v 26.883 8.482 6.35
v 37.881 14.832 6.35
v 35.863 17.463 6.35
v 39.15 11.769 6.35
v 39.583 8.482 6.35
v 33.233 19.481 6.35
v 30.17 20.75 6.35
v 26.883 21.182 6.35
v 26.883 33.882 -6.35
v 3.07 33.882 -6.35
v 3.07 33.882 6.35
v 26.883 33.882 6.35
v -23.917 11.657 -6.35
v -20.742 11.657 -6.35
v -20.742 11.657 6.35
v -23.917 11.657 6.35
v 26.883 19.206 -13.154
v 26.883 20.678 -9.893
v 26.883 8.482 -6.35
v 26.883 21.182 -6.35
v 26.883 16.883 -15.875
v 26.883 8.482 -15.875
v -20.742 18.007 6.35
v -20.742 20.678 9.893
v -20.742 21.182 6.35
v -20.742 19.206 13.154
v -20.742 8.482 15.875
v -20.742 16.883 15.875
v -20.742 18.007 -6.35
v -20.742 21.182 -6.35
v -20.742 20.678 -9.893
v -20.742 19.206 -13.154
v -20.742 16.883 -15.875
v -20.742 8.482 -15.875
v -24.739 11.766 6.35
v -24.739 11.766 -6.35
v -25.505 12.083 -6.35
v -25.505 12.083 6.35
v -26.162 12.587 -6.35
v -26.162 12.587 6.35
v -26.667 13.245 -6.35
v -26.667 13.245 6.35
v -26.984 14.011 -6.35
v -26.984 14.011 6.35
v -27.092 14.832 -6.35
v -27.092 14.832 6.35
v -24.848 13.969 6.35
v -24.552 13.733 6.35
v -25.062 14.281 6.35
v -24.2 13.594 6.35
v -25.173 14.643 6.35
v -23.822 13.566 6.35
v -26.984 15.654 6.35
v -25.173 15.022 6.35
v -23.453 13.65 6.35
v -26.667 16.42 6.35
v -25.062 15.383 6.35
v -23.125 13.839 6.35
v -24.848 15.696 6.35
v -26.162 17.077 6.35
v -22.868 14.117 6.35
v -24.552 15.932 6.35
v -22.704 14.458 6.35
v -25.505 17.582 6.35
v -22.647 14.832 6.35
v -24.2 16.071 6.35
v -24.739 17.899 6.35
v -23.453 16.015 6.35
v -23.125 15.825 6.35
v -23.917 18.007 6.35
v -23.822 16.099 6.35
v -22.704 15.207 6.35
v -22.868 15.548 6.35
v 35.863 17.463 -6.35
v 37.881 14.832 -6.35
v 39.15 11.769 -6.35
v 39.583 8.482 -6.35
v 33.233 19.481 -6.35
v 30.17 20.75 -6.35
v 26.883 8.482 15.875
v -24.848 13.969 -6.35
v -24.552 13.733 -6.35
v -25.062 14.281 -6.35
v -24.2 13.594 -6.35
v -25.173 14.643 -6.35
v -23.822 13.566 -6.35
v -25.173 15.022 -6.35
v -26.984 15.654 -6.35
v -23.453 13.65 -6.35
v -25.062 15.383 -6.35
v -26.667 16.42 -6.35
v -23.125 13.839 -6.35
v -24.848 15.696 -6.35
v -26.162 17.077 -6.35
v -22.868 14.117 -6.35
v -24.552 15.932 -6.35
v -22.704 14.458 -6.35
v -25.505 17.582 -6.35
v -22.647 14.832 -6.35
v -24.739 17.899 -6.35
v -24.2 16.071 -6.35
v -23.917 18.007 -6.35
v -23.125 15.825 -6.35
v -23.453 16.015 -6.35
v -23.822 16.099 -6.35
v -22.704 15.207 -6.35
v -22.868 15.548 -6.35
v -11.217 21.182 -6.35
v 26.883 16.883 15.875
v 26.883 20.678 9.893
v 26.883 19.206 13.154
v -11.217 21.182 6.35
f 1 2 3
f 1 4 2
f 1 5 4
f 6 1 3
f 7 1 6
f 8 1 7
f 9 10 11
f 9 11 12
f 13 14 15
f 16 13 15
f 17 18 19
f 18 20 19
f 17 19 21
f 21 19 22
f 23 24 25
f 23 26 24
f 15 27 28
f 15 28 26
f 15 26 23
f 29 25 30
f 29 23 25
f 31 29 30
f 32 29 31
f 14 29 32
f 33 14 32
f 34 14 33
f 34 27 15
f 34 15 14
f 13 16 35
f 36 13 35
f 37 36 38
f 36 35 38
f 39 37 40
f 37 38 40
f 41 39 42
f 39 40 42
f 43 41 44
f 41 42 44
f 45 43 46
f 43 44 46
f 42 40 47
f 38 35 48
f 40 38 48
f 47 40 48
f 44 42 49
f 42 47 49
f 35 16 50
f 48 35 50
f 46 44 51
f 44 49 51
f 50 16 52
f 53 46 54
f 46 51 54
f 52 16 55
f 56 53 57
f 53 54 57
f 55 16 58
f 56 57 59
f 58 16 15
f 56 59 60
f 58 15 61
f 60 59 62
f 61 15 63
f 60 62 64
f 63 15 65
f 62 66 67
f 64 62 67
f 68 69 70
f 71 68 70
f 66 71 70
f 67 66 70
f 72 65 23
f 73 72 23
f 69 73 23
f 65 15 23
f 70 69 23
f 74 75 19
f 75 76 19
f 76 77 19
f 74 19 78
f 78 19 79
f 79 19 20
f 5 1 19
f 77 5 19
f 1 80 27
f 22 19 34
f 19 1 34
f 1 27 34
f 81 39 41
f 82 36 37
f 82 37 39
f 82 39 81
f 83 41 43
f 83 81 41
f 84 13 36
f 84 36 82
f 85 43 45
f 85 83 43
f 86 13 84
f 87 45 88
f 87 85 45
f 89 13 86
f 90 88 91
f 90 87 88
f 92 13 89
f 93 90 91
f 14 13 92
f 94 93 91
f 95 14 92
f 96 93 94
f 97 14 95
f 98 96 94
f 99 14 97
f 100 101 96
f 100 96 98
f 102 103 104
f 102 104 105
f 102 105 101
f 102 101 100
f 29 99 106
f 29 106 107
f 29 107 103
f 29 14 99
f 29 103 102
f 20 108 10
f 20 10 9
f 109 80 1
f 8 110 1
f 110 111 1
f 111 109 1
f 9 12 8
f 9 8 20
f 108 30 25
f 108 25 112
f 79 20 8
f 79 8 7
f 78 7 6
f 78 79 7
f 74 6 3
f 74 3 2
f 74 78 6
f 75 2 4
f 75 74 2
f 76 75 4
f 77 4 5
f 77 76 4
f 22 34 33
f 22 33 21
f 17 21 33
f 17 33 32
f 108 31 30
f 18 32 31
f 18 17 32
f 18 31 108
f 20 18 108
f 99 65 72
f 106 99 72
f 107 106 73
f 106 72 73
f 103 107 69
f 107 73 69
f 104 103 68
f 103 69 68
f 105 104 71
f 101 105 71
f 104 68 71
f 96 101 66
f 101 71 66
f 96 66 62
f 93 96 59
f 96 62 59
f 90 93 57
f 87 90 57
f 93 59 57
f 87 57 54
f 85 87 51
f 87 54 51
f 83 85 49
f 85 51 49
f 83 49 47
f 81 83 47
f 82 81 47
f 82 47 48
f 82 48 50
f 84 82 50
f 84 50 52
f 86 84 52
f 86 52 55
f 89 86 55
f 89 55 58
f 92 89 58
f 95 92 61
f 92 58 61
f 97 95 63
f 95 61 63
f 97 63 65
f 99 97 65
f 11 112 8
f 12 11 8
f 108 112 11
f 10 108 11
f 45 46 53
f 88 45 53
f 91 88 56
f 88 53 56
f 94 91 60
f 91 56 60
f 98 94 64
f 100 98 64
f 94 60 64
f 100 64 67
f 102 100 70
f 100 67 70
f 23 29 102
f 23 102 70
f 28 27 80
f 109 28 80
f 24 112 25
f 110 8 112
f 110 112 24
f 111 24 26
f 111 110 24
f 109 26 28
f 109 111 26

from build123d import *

# Parameters (mm, degrees)
SKETCH1_W           = 95.25
SKETCH1_H           = 63.5
BOSS_EXTRUDE1_DEPTH = 25.4
SKETCH2_W           = 76.2
SKETCH2_H           = 25.4
BOSS_EXTRUDE2_DEPTH = 25.4
CUT_EXTRUDE1_DEPTH  = 25.4
SKETCH4_W           = 25.4
SKETCH4_H           = 25.4
BOSS_EXTRUDE3_DEPTH = 25.4
CUT_EXTRUDE2_DEPTH  = 25.4
CUT_EXTRUDE3_DEPTH  = 95.25
SKETCH_1648_W       = 25.4
SKETCH_1648_H       = 12.7
BOSS_EXTRUDE4_DEPTH = 12.7
CUT_EXTRUDE4_DEPTH  = 25.4
SKETCH10_R          = 2.54
CUT_EXTRUDE5_DEPTH  = 25.4
SCALE1_SCALE        = 0.5


with BuildPart() as part:
    # Sketch1 → Boss-Extrude1 (new body)
    with BuildSketch(Plane(origin=(0, 0, 0), x_dir=(1, 0, 0), z_dir=(0, 1, 0))):
        Rectangle(SKETCH1_W, SKETCH1_H)
    extrude(amount=BOSS_EXTRUDE1_DEPTH)

    # Sketch2 → Boss-Extrude2 (add)
    with BuildSketch(Plane(origin=(0, 25.4, 0), x_dir=(1, 0, 0), z_dir=(0, 1, 0))):
        with Locations((9.525, 0)):
            Rectangle(SKETCH2_W, SKETCH2_H)
    extrude(amount=BOSS_EXTRUDE2_DEPTH)

    # Sketch3 → Cut-Extrude1 (cut)
    with BuildSketch(Plane.XY.offset(12.7)):
        Polygon((-28.575, 50.8), (-28.575, 25.4), (0, 50.8), align=None)
    extrude(amount=-CUT_EXTRUDE1_DEPTH, mode=Mode.SUBTRACT)

    # Sketch4 → Boss-Extrude3 (add)
    with BuildSketch(Plane(origin=(47.625, 0, 0), x_dir=(0, 0, -1), z_dir=(1, 0, 0))):
        with Locations((0, 12.7)):
            Rectangle(SKETCH4_W, SKETCH4_H)
    extrude(amount=BOSS_EXTRUDE3_DEPTH)

    # Sketch5 → Cut-Extrude2 (cut)
    with BuildSketch(Plane(origin=(0, 0, -12.7), x_dir=(-1, 0, 0), z_dir=(0, 0, -1))):
        with BuildLine():
            ThreePointArc((-47.625, 25.4), (-65.585512242, 17.960512242), (-73.025, 0))
            Line((-73.025, 0), (-73.025, 25.4))
            Line((-73.025, 25.4), (-47.625, 25.4))
        make_face()
    extrude(amount=-CUT_EXTRUDE2_DEPTH, mode=Mode.SUBTRACT)

    # Sketch7 → Cut-Extrude3 (cut)
    with BuildSketch(Plane(origin=(47.625, 0, 0), x_dir=(0, 0, -1), z_dir=(1, 0, 0))):
        with BuildLine():
            Line((-31.75, 16.800520825), (-31.75, 25.4))
            Line((-31.75, 25.4), (-12.7, 25.4))
            ThreePointArc((-12.7, 25.4), (-23.150520825, 23.150520825), (-31.75, 16.800520825))
        make_face()
        with BuildLine():
            Line((12.7, 25.4), (31.75, 25.4))
            Line((31.75, 25.4), (31.75, 16.800520825))
            ThreePointArc((31.75, 16.800520825), (23.150520825, 23.150520825), (12.7, 25.4))
        make_face()
    extrude(amount=-CUT_EXTRUDE3_DEPTH, mode=Mode.SUBTRACT)

    # Sketch 1648 → Boss-Extrude4 (add)
    with BuildSketch(Plane.ZY.offset(47.625)):
        with Locations((0, 12.7)):
            Rectangle(SKETCH_1648_W, SKETCH_1648_H)
    extrude(amount=BOSS_EXTRUDE4_DEPTH)

    # Sketch9 → Cut-Extrude4 (cut)
    with BuildSketch(Plane.XY.offset(12.7)):
        with BuildLine():
            ThreePointArc((-53.975, 6.35), (-58.465128061, 8.209871939), (-60.325, 12.7))
            Line((-60.325, 12.7), (-60.325, 6.35))
            Line((-60.325, 6.35), (-53.975, 6.35))
        make_face()
        with BuildLine():
            Line((-60.325, 19.05), (-60.325, 12.7))
            ThreePointArc((-60.325, 12.7), (-58.465128061, 17.190128061), (-53.975, 19.05))
            Line((-53.975, 19.05), (-60.325, 19.05))
        make_face()
    extrude(amount=-CUT_EXTRUDE4_DEPTH, mode=Mode.SUBTRACT)

    # Sketch10 → Cut-Extrude5 (cut)
    with BuildSketch(Plane.XY.offset(12.7)):
        with Locations((-53.975, 12.7)):
            Circle(SKETCH10_R)
    extrude(amount=-CUT_EXTRUDE5_DEPTH, mode=Mode.SUBTRACT)


with BuildPart() as part_1:
    # Scale1: scaled about (6.140340788, 16.964715806, 0)
    add(part.part.scale(SCALE1_SCALE).moved(Location((3.070170394, 8.482357903, 0))))


solid = part_1.part
